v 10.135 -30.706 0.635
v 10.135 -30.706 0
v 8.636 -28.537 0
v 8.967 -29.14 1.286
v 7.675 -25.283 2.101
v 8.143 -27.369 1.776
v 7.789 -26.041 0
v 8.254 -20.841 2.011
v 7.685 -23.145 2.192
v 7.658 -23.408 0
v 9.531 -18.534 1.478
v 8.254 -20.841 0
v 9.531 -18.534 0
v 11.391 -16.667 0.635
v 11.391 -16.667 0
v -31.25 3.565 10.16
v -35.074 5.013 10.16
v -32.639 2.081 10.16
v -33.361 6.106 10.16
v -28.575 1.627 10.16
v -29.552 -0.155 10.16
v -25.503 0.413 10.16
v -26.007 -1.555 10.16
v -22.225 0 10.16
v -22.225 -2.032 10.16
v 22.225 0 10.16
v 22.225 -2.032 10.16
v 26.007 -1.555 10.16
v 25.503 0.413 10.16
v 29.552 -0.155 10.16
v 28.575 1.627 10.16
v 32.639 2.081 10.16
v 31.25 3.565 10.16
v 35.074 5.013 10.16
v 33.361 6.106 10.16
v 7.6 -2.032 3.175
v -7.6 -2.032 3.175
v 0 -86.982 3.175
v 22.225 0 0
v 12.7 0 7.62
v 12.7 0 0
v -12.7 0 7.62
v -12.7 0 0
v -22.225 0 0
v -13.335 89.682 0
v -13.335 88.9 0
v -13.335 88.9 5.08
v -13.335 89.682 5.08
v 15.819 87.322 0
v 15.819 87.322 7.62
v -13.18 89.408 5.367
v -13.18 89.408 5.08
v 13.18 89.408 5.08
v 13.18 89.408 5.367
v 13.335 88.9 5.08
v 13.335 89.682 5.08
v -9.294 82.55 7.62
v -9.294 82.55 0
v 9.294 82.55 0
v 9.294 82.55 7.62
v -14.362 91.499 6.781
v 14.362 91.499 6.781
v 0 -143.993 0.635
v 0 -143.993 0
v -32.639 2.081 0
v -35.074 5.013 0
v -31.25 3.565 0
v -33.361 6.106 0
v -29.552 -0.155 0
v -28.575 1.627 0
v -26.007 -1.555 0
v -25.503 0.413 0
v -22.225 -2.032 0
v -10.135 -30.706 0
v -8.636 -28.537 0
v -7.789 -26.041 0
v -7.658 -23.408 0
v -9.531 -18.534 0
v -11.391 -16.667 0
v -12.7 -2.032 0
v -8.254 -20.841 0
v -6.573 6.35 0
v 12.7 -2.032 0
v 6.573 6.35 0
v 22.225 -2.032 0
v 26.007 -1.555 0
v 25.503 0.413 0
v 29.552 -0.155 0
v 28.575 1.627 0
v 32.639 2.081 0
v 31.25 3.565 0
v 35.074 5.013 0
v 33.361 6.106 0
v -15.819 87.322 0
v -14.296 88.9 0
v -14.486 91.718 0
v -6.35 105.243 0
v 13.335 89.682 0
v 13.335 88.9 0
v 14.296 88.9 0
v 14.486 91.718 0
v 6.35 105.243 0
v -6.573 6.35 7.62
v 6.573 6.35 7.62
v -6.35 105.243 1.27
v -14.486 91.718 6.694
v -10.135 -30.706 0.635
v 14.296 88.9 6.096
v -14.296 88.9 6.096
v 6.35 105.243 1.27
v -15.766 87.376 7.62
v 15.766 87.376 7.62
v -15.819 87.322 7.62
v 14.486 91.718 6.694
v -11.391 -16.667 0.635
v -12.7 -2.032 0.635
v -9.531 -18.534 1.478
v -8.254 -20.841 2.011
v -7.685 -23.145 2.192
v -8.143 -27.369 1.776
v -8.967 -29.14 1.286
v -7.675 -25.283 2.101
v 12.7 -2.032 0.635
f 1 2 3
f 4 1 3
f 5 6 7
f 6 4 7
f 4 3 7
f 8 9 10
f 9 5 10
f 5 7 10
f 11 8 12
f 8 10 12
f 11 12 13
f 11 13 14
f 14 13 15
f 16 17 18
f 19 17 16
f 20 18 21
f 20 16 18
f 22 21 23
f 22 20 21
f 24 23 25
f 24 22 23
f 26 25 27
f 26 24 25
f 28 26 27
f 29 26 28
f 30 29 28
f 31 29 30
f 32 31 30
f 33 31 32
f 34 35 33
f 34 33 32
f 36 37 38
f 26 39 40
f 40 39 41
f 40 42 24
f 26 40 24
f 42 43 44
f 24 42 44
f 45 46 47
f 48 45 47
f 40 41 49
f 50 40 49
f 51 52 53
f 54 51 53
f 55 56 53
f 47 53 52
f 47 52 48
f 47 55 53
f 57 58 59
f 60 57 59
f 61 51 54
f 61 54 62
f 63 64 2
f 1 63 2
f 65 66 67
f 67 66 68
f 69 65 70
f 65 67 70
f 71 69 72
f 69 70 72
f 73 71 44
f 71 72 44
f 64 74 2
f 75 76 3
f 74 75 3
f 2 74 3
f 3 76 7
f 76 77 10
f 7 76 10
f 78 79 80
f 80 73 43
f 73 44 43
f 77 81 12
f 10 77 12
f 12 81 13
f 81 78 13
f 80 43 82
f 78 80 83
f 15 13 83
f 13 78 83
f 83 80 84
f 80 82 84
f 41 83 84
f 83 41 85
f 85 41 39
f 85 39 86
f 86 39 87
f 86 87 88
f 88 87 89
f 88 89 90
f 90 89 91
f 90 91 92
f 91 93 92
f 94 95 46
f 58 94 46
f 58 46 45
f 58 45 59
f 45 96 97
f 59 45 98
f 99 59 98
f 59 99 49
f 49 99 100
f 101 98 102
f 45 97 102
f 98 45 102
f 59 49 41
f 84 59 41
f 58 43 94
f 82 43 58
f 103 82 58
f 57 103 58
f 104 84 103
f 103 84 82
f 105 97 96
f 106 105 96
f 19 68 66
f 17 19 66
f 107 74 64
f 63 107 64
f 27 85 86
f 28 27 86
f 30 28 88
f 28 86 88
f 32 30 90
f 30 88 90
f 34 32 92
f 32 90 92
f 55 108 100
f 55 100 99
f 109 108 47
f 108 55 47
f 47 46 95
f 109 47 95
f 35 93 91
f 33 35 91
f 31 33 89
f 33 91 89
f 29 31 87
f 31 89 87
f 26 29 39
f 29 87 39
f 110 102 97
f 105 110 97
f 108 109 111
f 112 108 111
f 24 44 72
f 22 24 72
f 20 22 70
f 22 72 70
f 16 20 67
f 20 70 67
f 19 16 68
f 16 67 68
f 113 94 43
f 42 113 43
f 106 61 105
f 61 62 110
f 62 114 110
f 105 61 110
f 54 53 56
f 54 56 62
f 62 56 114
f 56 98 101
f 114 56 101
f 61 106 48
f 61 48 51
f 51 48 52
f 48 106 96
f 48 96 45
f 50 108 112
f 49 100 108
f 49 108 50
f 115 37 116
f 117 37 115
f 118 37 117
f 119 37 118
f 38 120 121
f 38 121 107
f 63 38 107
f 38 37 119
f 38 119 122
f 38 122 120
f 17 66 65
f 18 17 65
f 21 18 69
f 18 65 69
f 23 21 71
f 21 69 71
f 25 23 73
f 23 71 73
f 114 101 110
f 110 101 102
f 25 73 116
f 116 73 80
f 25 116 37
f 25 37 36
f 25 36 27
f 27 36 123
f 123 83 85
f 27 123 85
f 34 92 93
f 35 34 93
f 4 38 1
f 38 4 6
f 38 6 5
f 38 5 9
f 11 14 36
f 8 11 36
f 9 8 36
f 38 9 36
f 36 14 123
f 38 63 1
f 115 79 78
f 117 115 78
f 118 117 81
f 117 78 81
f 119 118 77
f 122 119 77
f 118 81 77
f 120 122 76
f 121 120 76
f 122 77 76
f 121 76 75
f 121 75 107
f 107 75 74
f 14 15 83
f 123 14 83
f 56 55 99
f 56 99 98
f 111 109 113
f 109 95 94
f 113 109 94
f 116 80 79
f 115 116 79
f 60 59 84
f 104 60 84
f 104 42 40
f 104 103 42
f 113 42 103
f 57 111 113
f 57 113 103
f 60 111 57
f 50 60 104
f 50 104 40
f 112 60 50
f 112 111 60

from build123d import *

# Parameters (mm, degrees)
F1_DEPTH     = 7.62
F2_W         = 26.67
F2_H         = 5.08
F3_DEPTH     = 0.508
F5_DEPTH     = 7.62
F7_DEPTH     = 25.4
F8_T1_DEPTH  = 39.5884897473
F8_T3_DEPTH  = 43.1891092466
F8_T5_DEPTH  = 15.7316119842
F8_T10_DEPTH = 21.2484768612
F8_T15_DEPTH = 21.2484768612
F8_T20_DEPTH = 21.2484768612
F8_T25_DEPTH = 21.2484768612
F10_DEPTH    = 10.16
F12_DEPTH    = 3.175
F13_C1_SIZE2 = 5.08
F13_C1_SIZE  = 2.54
F13_C2_SIZE2 = 2.54
F13_C2_SIZE  = 5.08


# Not quite as in the source:
# - a fillet or chamfer that OpenCascade refuses, or shapes differently, is made with other operations: its cross-section is extruded or revolved along the edge and cut away or added


with BuildPart() as f1:
    # F0 (on Top) → F1 (new body)
    with BuildSketch(Plane.XY):
        Polygon((-15.875, 88.9), (-12.7, 0), (12.7, 0), (15.875, 88.9), align=None)
        Polygon((-6.5727372599, 6.35), (-9.2941658314, 82.55), (9.2941658314, 82.55), (6.5727372599, 6.35), align=None, mode=Mode.SUBTRACT)
    extrude(amount=F1_DEPTH)

    # F2 (on face) → F3 (join)
    with BuildSketch(Plane(origin=(0, 88.9, 0), x_dir=(-1, 0, 0), z_dir=(0, 1, 0))):
        with Locations((0, 2.54)):
            Rectangle(F2_W, F2_H)
    extrude(amount=F3_DEPTH)

    # F4 (on Top) → F5 (join, through all)
    with BuildSketch(Plane.XY):
        Polygon((-6.35, 105.2430003945), (-15.875, 89.408), (15.875, 89.408), (6.35, 105.2430003945), align=None)
    extrude(amount=F5_DEPTH)

    # F6 (on Right) → F7 (cut, symmetric)
    with BuildSketch(Plane.YZ):
        Polygon((105.2430003945, 7.62), (89.408, 7.62), (105.2430003945, 1.27), align=None)
    extrude(amount=F7_DEPTH, both=True, mode=Mode.SUBTRACT)

    # F8: chamfer of 1.524 on 6 edges, made by hand

    # F8_s2 → F8_t1 (cut)
    with BuildSketch(Plane.YZ.offset(-19.7942448737)):
        Polygon((88.9, 6.096), (87.376, 7.62), (88.9, 7.62), align=None)
    extrude(amount=F8_T1_DEPTH, mode=Mode.SUBTRACT)

    # F8_s4 → F8_t3 (cut)
    with BuildSketch(Plane.YZ.offset(-21.5945546233)):
        Polygon((89.408, 5.3668893881), (91.4992312711, 6.7813944907), (89.408, 7.62), align=None)
    extrude(amount=F8_T3_DEPTH, mode=Mode.SUBTRACT)

    # F8_s6 → F8_t5 (cut)
    with BuildSketch(Plane.XY.offset(-4.0558059921)):
        Polygon((14.2955997995, 88.9), (15.8186287896, 87.3216061075), (15.875, 88.9), align=None)
        Polygon((-14.2955997995, 88.9), (-15.8186287896, 87.3216061075), (-15.875, 88.9), align=None)
    extrude(amount=F8_T5_DEPTH, mode=Mode.SUBTRACT)


with BuildPart() as f8_tool8:
    # F8_s9 → F8_t10 (new body)
    with BuildSketch(Plane.XY.offset(-6.8142384306)):
        Polygon((13.1798265815, 89.408), (14.4857717649, 91.7175464201), (15.875, 89.408), align=None)
    extrude(amount=F8_T10_DEPTH)

    split(bisect_by=Plane.YZ.offset(13.335), keep=Keep.TOP)


with BuildPart() as f1_1:
    add(f1.part)

    # F8_t7: cut F8_tool8
    add(f8_tool8.part, mode=Mode.SUBTRACT)


with BuildPart() as f8_tool13:
    # F8_s14 → F8_t15 (new body)
    with BuildSketch(Plane.XY.offset(-6.8142384306)):
        Polygon((13.1798265815, 89.408), (14.4857717649, 91.7175464201), (15.875, 89.408), align=None)
    extrude(amount=F8_T15_DEPTH)

    split(bisect_by=Plane.XY.offset(5.08), keep=Keep.TOP)


with BuildPart() as f1_2:
    add(f1_1.part)

    # F8_t12: cut F8_tool13
    add(f8_tool13.part, mode=Mode.SUBTRACT)


with BuildPart() as f8_tool18:
    # F8_s19 → F8_t20 (new body)
    with BuildSketch(Plane.XY.offset(-6.8142384306)):
        Polygon((-14.4857717649, 91.7175464201), (-13.1798265815, 89.408), (-15.875, 89.408), align=None)
    extrude(amount=F8_T20_DEPTH)

    split(bisect_by=Plane.YZ.offset(-13.335), keep=Keep.BOTTOM)


with BuildPart() as f1_3:
    add(f1_2.part)

    # F8_t17: cut F8_tool18
    add(f8_tool18.part, mode=Mode.SUBTRACT)


with BuildPart() as f8_tool23:
    # F8_s24 → F8_t25 (new body)
    with BuildSketch(Plane.XY.offset(-6.8142384306)):
        Polygon((-14.4857717649, 91.7175464201), (-13.1798265815, 89.408), (-15.875, 89.408), align=None)
    extrude(amount=F8_T25_DEPTH)

    split(bisect_by=Plane.XY.offset(5.08), keep=Keep.TOP)


with BuildPart() as f1_4:
    add(f1_3.part)

    # F8_t22: cut F8_tool23
    add(f8_tool23.part, mode=Mode.SUBTRACT)

    # F9 (on Top) → F10 (join)
    with BuildSketch(Plane.XY):
        with BuildLine():
            Line((22.2250049976, 0), (-22.2250049976, 0))
            ThreePointArc((-22.2250049976, 0), (-28.5750049976, 1.626602675), (-33.360963964, 6.1057692308))
            Line((-33.360963964, 6.1057692308), (-35.0741884204, 5.0131183432))
            ThreePointArc((-35.0741884204, 5.0131183432), (-29.5519258835, -0.155151961), (-22.225, -2.032))
            Line((-22.225, -2.032), (22.225, -2.032))
            ThreePointArc((22.225, -2.032), (29.5519258835, -0.155151961), (35.0741884204, 5.0131183432))
            Line((35.0741884204, 5.0131183432), (33.360963964, 6.1057692308))
            ThreePointArc((33.360963964, 6.1057692308), (28.5750049976, 1.626602675), (22.2250049976, 0))
        make_face()
    extrude(amount=F10_DEPTH)

    # F11 (on Top) → F12 (join)
    with BuildSketch(Plane.XY):
        with BuildLine():
            Line((12.7, -2.032), (-12.7, -2.032))
            Line((-12.7, -2.032), (-11.3907730168, -16.6665786134))
            ThreePointArc((-11.3907730168, -16.6665786134), (-7.6578884737, -23.408271606), (-10.1348339359, -30.7055034507))
            Line((-10.1348339359, -30.7055034507), (0, -143.9929821467))
            Line((0, -143.9929821467), (10.1348339359, -30.7055034507))
            ThreePointArc((10.1348339359, -30.7055034507), (7.6578884737, -23.408271606), (11.3907730168, -16.6665786134))
            Line((11.3907730168, -16.6665786134), (12.7, -2.032))
        make_face()
    extrude(amount=F12_DEPTH)

    # F13: chamfer of 2.54 x 5.08 on 4 edges, made by hand

    # F13_c1
    f13_c1_edges = [f1_4.edges().sort_by_distance(p)[0] for p in [
        (-12.0453865084, -9.3492893067, 3.175),
    ]]
    f13_c1_side = f1_4.faces().sort_by_distance((-12.0453865084, -9.3492893067, 3.1242))[0]
    chamfer(f13_c1_edges, length=F13_C1_SIZE, length2=F13_C1_SIZE2, reference=f13_c1_side)

    # F13_c2
    f13_c2_edges = [f1_4.edges().sort_by_distance(p)[0] for p in [
        (6.3424889397, -73.0964499313, 3.175),
    ]]
    f13_c2_side = f1_4.faces().sort_by_distance((6.2918910116, -73.0919233799, 3.175))[0]
    chamfer(f13_c2_edges, length=F13_C2_SIZE, length2=F13_C2_SIZE2, reference=f13_c2_side)


solid = f1_4.part
